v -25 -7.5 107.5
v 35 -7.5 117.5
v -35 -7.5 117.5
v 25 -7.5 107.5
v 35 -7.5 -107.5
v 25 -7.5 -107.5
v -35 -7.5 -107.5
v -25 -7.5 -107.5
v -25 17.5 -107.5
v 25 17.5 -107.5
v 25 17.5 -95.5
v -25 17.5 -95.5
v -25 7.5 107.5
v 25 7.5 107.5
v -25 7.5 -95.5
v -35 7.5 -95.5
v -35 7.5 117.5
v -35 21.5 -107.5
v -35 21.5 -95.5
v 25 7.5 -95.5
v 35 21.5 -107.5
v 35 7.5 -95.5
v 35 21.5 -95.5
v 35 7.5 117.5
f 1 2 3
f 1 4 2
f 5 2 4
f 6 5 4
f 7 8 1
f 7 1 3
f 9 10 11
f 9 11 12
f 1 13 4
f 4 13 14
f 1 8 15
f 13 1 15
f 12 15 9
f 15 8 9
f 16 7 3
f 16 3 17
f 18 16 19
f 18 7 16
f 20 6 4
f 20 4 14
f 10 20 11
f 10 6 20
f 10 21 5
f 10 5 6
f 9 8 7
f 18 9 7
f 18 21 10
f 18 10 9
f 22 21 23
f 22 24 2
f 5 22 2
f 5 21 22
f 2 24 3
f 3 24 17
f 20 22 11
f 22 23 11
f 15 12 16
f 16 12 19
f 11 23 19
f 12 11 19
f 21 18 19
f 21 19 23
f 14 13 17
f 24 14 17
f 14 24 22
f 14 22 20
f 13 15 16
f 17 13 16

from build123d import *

# Parameters (mm, degrees)
BOSS_EXTRUDE1_DEPTH = 7.5
SKETCH2_W           = 10
SKETCH2_H           = 10
BOSS_EXTRUDE2_DEPTH = 12


with BuildPart() as part:
    # Sketch1 → Boss-Extrude1 (new, symmetric)
    with BuildSketch(Plane(origin=(0, 0, 0), x_dir=(1, 0, 0), z_dir=(0, 1, 0))):
        Polygon((25, 107.5), (35, 107.5), (35, -117.5), (-35, -117.5), (-35, 107.5), (-25, 107.5), (-25, -107.5), (25, -107.5), align=None)
    extrude(amount=BOSS_EXTRUDE1_DEPTH, both=True)

    # Sketch2 → Boss-Extrude2 (add)
    with BuildSketch(Plane(origin=(0, 0, -107.5), x_dir=(-1, 0, 0), z_dir=(0, 0, -1))):
        with Locations((-30, 12.5)):
            Rectangle(SKETCH2_W, SKETCH2_H)
        Polygon((-35, 21.5), (-35, 17.5), (-25, 17.5), (25, 17.5), (35, 17.5), (35, 21.5), align=None)
        with Locations((30, 12.5)):
            Rectangle(SKETCH2_W, SKETCH2_H)
    extrude(amount=-BOSS_EXTRUDE2_DEPTH)


solid = part.part
